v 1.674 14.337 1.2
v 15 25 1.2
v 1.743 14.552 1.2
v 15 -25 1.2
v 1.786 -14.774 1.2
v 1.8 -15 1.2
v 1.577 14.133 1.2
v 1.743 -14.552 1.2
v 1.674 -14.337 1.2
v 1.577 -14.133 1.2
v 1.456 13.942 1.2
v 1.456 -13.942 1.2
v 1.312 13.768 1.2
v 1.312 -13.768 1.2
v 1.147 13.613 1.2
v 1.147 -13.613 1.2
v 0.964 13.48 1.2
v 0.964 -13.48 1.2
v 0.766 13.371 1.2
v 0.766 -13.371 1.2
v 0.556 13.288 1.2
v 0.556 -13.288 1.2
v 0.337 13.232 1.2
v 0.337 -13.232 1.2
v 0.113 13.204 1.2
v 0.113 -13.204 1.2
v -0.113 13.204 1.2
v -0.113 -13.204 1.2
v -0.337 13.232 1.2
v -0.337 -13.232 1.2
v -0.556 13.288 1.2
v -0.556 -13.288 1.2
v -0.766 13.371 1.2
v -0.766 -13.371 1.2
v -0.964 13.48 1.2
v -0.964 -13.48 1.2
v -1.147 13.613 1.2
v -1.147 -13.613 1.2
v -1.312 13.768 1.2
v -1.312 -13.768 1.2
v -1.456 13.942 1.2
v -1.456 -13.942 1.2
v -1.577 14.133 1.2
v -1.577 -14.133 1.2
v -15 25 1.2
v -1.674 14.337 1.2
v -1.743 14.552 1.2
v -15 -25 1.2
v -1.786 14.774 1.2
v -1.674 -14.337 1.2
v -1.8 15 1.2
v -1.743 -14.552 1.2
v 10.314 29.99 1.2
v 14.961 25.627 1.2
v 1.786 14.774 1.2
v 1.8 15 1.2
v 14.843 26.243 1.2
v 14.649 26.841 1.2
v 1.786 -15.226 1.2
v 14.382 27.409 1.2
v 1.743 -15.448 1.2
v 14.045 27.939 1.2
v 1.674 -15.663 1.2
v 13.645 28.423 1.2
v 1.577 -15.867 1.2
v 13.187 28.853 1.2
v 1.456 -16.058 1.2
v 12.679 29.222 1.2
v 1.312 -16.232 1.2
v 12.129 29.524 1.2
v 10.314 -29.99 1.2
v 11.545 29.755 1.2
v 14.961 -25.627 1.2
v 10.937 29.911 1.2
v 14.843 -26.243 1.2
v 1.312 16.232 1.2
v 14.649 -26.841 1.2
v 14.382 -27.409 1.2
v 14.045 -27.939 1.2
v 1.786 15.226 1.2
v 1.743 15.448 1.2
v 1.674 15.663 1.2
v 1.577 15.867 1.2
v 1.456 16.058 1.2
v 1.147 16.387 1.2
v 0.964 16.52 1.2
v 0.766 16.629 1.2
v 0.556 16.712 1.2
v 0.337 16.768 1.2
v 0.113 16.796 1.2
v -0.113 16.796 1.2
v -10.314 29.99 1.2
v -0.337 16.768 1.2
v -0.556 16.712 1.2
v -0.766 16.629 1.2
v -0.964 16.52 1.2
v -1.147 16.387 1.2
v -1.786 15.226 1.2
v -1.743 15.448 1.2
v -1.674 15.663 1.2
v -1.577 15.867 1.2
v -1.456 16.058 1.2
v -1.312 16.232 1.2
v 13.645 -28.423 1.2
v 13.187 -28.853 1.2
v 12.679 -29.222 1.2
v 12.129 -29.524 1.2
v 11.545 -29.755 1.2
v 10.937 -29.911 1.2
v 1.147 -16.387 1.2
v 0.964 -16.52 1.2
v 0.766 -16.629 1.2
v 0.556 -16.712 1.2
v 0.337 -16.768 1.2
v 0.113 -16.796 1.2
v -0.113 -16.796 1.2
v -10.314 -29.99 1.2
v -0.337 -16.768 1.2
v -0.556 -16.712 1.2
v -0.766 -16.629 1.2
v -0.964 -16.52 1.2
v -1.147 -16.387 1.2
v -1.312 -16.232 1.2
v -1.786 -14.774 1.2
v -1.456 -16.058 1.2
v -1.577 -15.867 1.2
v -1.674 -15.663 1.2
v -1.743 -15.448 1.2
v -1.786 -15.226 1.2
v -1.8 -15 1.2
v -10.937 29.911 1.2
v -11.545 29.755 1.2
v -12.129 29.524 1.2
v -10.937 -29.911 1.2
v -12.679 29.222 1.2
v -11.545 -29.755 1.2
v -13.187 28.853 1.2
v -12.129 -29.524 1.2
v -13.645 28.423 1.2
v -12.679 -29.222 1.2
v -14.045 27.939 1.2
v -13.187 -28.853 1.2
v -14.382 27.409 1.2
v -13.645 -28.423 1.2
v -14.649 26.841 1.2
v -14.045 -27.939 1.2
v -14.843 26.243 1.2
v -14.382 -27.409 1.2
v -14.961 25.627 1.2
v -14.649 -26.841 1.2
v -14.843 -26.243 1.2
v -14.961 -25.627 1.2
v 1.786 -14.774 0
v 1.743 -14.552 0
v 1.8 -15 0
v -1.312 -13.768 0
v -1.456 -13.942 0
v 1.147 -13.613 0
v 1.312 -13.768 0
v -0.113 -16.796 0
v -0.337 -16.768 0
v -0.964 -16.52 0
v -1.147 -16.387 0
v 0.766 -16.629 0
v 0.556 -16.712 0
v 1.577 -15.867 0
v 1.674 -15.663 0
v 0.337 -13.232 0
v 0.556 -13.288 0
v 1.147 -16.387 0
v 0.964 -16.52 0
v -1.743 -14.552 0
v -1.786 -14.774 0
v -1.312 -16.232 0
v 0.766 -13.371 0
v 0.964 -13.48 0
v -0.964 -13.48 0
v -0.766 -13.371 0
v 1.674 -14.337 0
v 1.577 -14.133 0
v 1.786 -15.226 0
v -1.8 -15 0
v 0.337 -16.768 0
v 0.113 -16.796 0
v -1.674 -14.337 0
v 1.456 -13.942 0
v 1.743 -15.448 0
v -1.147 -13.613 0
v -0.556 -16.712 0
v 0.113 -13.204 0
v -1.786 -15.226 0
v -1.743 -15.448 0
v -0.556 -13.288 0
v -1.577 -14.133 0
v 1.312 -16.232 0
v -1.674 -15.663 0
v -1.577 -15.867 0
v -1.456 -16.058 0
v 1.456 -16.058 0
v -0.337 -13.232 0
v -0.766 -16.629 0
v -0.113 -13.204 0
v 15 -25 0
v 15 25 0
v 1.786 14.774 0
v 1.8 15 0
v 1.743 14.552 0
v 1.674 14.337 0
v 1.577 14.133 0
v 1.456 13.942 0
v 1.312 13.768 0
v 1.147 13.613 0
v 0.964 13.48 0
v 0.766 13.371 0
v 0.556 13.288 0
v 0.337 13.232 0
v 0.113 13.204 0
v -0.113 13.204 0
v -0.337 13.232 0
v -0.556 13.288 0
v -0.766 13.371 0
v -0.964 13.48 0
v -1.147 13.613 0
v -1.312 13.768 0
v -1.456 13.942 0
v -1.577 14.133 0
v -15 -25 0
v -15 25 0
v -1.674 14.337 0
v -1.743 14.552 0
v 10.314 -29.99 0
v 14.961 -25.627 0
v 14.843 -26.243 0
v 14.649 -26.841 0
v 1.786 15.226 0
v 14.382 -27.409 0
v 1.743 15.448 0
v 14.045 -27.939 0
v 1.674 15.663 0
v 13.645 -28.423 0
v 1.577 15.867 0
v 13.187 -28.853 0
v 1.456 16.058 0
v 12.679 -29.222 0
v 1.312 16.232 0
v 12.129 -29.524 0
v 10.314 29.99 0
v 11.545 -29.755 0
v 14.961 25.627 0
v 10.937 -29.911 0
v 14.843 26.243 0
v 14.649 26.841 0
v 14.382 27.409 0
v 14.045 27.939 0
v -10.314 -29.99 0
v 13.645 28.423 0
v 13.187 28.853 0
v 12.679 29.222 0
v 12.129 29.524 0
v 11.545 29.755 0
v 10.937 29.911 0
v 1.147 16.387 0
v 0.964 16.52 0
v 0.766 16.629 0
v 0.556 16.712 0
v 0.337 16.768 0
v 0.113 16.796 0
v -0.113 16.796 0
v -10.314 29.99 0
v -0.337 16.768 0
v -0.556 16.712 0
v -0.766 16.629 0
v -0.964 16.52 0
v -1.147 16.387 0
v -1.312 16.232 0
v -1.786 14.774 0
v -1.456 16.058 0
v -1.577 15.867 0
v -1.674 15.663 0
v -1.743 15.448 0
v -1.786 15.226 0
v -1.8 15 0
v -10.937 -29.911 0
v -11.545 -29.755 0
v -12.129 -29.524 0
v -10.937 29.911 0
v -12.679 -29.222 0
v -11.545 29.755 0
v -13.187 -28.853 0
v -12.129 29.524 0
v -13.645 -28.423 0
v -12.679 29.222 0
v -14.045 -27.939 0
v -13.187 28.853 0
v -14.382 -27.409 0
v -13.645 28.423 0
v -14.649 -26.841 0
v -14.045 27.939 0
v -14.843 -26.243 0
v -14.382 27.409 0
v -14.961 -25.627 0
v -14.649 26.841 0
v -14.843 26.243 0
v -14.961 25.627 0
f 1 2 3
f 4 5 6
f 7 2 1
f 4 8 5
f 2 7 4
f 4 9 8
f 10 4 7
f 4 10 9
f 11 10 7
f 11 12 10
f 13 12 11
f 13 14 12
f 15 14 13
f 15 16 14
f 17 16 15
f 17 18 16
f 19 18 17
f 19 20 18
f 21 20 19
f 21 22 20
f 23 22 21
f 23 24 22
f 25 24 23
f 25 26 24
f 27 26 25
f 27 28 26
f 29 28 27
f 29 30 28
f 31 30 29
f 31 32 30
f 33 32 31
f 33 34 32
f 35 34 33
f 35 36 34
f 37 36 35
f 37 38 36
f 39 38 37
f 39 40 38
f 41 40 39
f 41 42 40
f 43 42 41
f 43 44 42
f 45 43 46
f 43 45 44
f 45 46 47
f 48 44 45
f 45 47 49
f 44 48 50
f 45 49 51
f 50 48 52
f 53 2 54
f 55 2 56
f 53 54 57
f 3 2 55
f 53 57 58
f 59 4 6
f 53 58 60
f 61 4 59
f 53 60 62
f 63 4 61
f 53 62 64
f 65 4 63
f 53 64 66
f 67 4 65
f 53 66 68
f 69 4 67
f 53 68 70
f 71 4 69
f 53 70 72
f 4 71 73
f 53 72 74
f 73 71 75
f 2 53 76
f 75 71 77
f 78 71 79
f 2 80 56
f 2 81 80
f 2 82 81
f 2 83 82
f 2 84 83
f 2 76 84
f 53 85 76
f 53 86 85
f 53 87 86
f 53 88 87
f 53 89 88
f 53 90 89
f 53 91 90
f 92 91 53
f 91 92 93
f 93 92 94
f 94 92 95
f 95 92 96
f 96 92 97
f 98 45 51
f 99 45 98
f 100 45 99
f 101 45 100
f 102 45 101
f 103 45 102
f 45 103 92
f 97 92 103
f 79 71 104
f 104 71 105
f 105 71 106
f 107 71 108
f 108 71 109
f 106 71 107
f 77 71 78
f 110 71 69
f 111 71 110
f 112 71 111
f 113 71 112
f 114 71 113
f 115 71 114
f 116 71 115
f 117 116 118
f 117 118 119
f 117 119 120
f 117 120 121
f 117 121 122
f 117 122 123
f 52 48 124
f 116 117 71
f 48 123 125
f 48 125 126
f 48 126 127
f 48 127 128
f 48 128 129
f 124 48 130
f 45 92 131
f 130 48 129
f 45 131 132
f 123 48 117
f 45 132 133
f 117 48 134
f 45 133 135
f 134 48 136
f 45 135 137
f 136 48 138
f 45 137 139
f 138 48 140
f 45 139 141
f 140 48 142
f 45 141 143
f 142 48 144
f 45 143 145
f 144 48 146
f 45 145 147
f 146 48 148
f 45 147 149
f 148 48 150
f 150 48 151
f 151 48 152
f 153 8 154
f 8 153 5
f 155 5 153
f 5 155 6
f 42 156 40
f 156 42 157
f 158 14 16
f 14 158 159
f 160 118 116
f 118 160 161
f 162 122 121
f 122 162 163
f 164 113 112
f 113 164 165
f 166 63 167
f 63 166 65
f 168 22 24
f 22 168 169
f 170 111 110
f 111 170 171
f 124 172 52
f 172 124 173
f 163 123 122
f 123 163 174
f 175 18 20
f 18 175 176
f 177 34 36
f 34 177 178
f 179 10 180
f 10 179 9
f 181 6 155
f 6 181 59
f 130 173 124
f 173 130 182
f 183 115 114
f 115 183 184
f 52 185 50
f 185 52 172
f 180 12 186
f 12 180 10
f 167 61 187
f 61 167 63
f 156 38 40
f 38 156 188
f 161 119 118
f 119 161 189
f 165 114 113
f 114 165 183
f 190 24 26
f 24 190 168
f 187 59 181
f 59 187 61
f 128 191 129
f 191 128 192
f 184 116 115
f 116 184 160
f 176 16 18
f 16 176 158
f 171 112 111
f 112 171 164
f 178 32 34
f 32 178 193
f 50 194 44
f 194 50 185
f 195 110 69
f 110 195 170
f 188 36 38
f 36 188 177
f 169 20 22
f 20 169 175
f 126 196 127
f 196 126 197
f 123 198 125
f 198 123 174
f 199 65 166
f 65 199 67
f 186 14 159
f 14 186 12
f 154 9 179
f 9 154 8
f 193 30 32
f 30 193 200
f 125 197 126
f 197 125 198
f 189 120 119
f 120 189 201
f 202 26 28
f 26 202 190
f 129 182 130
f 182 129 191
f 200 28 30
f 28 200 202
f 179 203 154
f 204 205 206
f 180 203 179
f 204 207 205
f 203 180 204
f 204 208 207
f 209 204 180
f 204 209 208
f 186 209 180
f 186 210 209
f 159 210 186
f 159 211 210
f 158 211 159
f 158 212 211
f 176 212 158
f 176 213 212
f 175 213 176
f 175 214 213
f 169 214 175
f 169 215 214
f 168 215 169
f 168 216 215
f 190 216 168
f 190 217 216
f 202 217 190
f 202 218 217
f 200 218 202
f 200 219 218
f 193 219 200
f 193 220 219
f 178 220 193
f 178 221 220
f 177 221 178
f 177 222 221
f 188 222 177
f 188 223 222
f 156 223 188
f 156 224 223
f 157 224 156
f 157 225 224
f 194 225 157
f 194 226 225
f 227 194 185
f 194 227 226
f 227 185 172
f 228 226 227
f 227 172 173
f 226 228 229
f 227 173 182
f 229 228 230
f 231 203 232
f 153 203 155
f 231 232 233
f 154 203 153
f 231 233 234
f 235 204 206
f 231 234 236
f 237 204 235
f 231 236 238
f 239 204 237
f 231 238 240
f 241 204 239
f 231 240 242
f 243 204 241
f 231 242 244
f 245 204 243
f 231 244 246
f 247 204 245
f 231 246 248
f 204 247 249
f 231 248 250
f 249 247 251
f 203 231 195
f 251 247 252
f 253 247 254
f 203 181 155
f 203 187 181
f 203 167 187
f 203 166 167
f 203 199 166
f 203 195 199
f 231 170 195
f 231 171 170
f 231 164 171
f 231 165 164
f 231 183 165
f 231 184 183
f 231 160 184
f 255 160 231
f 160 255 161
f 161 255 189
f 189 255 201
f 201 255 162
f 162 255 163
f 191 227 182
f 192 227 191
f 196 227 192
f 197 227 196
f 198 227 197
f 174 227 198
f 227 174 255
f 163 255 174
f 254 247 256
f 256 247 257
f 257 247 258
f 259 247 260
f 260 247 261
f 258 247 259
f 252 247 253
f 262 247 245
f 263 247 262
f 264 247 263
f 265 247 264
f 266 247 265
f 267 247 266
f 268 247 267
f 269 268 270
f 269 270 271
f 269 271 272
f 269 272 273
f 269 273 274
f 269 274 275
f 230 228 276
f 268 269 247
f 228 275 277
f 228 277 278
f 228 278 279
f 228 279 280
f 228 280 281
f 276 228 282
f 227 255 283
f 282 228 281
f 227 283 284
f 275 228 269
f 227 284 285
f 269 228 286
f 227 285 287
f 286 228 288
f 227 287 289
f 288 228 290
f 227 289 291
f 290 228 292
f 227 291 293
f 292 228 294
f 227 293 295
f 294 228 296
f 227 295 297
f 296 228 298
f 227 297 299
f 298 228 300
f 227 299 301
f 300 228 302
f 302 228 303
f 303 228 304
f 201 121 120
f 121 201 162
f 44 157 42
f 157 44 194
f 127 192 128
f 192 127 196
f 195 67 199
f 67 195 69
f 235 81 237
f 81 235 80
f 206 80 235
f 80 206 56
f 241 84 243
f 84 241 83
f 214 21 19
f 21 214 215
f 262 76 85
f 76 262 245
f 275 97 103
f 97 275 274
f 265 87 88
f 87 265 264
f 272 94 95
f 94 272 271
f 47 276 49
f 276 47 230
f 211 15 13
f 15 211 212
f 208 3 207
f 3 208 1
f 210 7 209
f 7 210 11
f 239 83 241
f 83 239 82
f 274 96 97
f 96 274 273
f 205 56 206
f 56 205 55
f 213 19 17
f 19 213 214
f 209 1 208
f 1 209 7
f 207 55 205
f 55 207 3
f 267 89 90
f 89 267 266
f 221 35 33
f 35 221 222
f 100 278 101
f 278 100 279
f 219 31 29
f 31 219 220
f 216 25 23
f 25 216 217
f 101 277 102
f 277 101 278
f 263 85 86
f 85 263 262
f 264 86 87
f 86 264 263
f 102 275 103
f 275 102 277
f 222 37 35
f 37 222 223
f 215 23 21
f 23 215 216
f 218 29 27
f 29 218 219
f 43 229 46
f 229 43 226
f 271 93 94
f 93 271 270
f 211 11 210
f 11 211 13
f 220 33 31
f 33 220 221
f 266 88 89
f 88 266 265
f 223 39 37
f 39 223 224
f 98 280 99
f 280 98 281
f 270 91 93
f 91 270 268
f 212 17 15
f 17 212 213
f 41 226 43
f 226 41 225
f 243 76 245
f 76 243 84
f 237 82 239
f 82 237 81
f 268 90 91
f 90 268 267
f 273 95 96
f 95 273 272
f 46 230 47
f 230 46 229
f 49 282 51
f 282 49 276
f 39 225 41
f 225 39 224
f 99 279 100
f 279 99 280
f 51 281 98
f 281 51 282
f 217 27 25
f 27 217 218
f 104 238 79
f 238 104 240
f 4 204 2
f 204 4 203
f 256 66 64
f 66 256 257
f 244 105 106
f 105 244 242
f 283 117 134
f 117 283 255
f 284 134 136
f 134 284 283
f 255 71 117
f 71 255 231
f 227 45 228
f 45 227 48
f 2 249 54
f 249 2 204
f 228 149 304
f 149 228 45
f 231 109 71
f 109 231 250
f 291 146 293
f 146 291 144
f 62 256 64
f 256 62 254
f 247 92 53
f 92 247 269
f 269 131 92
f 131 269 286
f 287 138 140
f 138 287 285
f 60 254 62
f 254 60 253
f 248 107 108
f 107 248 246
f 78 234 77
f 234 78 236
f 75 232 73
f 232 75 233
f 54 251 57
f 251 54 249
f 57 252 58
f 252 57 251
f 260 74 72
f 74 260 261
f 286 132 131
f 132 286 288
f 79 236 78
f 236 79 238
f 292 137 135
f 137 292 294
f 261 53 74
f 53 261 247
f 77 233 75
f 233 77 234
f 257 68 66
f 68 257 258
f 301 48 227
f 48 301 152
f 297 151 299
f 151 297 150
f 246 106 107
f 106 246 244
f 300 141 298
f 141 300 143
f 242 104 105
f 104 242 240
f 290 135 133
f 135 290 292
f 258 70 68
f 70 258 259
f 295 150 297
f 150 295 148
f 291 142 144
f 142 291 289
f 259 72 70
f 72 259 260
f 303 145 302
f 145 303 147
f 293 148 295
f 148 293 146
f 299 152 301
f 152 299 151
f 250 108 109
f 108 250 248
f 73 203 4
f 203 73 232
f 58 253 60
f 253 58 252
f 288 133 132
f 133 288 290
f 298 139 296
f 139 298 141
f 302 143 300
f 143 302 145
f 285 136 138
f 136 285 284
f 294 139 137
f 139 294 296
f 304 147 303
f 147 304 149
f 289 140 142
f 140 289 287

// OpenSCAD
$fn = 50;


difference() {
	union() {
		hull() {
			translate(v = [-10.0000000000, 25.0000000000, 0]) {
				cylinder(h = 21, r = 5);
			}
			translate(v = [10.0000000000, 25.0000000000, 0]) {
				cylinder(h = 21, r = 5);
			}
			translate(v = [-10.0000000000, -25.0000000000, 0]) {
				cylinder(h = 21, r = 5);
			}
			translate(v = [10.0000000000, -25.0000000000, 0]) {
				cylinder(h = 21, r = 5);
			}
		}
	}
	union() {
		translate(v = [0, 0, 1.2000000000]) {
			hull() {
				translate(v = [-10.0000000000, 25.0000000000, 0]) {
					cylinder(h = 19.8000000000, r = 3.8000000000);
				}
				translate(v = [10.0000000000, 25.0000000000, 0]) {
					cylinder(h = 19.8000000000, r = 3.8000000000);
				}
				translate(v = [-10.0000000000, -25.0000000000, 0]) {
					cylinder(h = 19.8000000000, r = 3.8000000000);
				}
				translate(v = [10.0000000000, -25.0000000000, 0]) {
					cylinder(h = 19.8000000000, r = 3.8000000000);
				}
			}
		}
		#translate(v = [0.0000000000, -15.0000000000, 0]) {
			cylinder(h = 1.2000000000, r = 1.8000000000);
		}
		#translate(v = [0.0000000000, 15.0000000000, 0]) {
			cylinder(h = 1.2000000000, r = 1.8000000000);
		}
		translate(v = [-250.0000000000, -250.0000000000, 1.2000000000]) {
			cube(size = [500, 500, 500]);
		}
		translate(v = [-250.0000000000, -250.0000000000, 1.2000000000]) {
			cube(size = [500, 500, 500]);
		}
		translate(v = [-250.0000000000, -250.0000000000, 1.2000000000]) {
			cube(size = [500, 500, 500]);
		}
	}
}
